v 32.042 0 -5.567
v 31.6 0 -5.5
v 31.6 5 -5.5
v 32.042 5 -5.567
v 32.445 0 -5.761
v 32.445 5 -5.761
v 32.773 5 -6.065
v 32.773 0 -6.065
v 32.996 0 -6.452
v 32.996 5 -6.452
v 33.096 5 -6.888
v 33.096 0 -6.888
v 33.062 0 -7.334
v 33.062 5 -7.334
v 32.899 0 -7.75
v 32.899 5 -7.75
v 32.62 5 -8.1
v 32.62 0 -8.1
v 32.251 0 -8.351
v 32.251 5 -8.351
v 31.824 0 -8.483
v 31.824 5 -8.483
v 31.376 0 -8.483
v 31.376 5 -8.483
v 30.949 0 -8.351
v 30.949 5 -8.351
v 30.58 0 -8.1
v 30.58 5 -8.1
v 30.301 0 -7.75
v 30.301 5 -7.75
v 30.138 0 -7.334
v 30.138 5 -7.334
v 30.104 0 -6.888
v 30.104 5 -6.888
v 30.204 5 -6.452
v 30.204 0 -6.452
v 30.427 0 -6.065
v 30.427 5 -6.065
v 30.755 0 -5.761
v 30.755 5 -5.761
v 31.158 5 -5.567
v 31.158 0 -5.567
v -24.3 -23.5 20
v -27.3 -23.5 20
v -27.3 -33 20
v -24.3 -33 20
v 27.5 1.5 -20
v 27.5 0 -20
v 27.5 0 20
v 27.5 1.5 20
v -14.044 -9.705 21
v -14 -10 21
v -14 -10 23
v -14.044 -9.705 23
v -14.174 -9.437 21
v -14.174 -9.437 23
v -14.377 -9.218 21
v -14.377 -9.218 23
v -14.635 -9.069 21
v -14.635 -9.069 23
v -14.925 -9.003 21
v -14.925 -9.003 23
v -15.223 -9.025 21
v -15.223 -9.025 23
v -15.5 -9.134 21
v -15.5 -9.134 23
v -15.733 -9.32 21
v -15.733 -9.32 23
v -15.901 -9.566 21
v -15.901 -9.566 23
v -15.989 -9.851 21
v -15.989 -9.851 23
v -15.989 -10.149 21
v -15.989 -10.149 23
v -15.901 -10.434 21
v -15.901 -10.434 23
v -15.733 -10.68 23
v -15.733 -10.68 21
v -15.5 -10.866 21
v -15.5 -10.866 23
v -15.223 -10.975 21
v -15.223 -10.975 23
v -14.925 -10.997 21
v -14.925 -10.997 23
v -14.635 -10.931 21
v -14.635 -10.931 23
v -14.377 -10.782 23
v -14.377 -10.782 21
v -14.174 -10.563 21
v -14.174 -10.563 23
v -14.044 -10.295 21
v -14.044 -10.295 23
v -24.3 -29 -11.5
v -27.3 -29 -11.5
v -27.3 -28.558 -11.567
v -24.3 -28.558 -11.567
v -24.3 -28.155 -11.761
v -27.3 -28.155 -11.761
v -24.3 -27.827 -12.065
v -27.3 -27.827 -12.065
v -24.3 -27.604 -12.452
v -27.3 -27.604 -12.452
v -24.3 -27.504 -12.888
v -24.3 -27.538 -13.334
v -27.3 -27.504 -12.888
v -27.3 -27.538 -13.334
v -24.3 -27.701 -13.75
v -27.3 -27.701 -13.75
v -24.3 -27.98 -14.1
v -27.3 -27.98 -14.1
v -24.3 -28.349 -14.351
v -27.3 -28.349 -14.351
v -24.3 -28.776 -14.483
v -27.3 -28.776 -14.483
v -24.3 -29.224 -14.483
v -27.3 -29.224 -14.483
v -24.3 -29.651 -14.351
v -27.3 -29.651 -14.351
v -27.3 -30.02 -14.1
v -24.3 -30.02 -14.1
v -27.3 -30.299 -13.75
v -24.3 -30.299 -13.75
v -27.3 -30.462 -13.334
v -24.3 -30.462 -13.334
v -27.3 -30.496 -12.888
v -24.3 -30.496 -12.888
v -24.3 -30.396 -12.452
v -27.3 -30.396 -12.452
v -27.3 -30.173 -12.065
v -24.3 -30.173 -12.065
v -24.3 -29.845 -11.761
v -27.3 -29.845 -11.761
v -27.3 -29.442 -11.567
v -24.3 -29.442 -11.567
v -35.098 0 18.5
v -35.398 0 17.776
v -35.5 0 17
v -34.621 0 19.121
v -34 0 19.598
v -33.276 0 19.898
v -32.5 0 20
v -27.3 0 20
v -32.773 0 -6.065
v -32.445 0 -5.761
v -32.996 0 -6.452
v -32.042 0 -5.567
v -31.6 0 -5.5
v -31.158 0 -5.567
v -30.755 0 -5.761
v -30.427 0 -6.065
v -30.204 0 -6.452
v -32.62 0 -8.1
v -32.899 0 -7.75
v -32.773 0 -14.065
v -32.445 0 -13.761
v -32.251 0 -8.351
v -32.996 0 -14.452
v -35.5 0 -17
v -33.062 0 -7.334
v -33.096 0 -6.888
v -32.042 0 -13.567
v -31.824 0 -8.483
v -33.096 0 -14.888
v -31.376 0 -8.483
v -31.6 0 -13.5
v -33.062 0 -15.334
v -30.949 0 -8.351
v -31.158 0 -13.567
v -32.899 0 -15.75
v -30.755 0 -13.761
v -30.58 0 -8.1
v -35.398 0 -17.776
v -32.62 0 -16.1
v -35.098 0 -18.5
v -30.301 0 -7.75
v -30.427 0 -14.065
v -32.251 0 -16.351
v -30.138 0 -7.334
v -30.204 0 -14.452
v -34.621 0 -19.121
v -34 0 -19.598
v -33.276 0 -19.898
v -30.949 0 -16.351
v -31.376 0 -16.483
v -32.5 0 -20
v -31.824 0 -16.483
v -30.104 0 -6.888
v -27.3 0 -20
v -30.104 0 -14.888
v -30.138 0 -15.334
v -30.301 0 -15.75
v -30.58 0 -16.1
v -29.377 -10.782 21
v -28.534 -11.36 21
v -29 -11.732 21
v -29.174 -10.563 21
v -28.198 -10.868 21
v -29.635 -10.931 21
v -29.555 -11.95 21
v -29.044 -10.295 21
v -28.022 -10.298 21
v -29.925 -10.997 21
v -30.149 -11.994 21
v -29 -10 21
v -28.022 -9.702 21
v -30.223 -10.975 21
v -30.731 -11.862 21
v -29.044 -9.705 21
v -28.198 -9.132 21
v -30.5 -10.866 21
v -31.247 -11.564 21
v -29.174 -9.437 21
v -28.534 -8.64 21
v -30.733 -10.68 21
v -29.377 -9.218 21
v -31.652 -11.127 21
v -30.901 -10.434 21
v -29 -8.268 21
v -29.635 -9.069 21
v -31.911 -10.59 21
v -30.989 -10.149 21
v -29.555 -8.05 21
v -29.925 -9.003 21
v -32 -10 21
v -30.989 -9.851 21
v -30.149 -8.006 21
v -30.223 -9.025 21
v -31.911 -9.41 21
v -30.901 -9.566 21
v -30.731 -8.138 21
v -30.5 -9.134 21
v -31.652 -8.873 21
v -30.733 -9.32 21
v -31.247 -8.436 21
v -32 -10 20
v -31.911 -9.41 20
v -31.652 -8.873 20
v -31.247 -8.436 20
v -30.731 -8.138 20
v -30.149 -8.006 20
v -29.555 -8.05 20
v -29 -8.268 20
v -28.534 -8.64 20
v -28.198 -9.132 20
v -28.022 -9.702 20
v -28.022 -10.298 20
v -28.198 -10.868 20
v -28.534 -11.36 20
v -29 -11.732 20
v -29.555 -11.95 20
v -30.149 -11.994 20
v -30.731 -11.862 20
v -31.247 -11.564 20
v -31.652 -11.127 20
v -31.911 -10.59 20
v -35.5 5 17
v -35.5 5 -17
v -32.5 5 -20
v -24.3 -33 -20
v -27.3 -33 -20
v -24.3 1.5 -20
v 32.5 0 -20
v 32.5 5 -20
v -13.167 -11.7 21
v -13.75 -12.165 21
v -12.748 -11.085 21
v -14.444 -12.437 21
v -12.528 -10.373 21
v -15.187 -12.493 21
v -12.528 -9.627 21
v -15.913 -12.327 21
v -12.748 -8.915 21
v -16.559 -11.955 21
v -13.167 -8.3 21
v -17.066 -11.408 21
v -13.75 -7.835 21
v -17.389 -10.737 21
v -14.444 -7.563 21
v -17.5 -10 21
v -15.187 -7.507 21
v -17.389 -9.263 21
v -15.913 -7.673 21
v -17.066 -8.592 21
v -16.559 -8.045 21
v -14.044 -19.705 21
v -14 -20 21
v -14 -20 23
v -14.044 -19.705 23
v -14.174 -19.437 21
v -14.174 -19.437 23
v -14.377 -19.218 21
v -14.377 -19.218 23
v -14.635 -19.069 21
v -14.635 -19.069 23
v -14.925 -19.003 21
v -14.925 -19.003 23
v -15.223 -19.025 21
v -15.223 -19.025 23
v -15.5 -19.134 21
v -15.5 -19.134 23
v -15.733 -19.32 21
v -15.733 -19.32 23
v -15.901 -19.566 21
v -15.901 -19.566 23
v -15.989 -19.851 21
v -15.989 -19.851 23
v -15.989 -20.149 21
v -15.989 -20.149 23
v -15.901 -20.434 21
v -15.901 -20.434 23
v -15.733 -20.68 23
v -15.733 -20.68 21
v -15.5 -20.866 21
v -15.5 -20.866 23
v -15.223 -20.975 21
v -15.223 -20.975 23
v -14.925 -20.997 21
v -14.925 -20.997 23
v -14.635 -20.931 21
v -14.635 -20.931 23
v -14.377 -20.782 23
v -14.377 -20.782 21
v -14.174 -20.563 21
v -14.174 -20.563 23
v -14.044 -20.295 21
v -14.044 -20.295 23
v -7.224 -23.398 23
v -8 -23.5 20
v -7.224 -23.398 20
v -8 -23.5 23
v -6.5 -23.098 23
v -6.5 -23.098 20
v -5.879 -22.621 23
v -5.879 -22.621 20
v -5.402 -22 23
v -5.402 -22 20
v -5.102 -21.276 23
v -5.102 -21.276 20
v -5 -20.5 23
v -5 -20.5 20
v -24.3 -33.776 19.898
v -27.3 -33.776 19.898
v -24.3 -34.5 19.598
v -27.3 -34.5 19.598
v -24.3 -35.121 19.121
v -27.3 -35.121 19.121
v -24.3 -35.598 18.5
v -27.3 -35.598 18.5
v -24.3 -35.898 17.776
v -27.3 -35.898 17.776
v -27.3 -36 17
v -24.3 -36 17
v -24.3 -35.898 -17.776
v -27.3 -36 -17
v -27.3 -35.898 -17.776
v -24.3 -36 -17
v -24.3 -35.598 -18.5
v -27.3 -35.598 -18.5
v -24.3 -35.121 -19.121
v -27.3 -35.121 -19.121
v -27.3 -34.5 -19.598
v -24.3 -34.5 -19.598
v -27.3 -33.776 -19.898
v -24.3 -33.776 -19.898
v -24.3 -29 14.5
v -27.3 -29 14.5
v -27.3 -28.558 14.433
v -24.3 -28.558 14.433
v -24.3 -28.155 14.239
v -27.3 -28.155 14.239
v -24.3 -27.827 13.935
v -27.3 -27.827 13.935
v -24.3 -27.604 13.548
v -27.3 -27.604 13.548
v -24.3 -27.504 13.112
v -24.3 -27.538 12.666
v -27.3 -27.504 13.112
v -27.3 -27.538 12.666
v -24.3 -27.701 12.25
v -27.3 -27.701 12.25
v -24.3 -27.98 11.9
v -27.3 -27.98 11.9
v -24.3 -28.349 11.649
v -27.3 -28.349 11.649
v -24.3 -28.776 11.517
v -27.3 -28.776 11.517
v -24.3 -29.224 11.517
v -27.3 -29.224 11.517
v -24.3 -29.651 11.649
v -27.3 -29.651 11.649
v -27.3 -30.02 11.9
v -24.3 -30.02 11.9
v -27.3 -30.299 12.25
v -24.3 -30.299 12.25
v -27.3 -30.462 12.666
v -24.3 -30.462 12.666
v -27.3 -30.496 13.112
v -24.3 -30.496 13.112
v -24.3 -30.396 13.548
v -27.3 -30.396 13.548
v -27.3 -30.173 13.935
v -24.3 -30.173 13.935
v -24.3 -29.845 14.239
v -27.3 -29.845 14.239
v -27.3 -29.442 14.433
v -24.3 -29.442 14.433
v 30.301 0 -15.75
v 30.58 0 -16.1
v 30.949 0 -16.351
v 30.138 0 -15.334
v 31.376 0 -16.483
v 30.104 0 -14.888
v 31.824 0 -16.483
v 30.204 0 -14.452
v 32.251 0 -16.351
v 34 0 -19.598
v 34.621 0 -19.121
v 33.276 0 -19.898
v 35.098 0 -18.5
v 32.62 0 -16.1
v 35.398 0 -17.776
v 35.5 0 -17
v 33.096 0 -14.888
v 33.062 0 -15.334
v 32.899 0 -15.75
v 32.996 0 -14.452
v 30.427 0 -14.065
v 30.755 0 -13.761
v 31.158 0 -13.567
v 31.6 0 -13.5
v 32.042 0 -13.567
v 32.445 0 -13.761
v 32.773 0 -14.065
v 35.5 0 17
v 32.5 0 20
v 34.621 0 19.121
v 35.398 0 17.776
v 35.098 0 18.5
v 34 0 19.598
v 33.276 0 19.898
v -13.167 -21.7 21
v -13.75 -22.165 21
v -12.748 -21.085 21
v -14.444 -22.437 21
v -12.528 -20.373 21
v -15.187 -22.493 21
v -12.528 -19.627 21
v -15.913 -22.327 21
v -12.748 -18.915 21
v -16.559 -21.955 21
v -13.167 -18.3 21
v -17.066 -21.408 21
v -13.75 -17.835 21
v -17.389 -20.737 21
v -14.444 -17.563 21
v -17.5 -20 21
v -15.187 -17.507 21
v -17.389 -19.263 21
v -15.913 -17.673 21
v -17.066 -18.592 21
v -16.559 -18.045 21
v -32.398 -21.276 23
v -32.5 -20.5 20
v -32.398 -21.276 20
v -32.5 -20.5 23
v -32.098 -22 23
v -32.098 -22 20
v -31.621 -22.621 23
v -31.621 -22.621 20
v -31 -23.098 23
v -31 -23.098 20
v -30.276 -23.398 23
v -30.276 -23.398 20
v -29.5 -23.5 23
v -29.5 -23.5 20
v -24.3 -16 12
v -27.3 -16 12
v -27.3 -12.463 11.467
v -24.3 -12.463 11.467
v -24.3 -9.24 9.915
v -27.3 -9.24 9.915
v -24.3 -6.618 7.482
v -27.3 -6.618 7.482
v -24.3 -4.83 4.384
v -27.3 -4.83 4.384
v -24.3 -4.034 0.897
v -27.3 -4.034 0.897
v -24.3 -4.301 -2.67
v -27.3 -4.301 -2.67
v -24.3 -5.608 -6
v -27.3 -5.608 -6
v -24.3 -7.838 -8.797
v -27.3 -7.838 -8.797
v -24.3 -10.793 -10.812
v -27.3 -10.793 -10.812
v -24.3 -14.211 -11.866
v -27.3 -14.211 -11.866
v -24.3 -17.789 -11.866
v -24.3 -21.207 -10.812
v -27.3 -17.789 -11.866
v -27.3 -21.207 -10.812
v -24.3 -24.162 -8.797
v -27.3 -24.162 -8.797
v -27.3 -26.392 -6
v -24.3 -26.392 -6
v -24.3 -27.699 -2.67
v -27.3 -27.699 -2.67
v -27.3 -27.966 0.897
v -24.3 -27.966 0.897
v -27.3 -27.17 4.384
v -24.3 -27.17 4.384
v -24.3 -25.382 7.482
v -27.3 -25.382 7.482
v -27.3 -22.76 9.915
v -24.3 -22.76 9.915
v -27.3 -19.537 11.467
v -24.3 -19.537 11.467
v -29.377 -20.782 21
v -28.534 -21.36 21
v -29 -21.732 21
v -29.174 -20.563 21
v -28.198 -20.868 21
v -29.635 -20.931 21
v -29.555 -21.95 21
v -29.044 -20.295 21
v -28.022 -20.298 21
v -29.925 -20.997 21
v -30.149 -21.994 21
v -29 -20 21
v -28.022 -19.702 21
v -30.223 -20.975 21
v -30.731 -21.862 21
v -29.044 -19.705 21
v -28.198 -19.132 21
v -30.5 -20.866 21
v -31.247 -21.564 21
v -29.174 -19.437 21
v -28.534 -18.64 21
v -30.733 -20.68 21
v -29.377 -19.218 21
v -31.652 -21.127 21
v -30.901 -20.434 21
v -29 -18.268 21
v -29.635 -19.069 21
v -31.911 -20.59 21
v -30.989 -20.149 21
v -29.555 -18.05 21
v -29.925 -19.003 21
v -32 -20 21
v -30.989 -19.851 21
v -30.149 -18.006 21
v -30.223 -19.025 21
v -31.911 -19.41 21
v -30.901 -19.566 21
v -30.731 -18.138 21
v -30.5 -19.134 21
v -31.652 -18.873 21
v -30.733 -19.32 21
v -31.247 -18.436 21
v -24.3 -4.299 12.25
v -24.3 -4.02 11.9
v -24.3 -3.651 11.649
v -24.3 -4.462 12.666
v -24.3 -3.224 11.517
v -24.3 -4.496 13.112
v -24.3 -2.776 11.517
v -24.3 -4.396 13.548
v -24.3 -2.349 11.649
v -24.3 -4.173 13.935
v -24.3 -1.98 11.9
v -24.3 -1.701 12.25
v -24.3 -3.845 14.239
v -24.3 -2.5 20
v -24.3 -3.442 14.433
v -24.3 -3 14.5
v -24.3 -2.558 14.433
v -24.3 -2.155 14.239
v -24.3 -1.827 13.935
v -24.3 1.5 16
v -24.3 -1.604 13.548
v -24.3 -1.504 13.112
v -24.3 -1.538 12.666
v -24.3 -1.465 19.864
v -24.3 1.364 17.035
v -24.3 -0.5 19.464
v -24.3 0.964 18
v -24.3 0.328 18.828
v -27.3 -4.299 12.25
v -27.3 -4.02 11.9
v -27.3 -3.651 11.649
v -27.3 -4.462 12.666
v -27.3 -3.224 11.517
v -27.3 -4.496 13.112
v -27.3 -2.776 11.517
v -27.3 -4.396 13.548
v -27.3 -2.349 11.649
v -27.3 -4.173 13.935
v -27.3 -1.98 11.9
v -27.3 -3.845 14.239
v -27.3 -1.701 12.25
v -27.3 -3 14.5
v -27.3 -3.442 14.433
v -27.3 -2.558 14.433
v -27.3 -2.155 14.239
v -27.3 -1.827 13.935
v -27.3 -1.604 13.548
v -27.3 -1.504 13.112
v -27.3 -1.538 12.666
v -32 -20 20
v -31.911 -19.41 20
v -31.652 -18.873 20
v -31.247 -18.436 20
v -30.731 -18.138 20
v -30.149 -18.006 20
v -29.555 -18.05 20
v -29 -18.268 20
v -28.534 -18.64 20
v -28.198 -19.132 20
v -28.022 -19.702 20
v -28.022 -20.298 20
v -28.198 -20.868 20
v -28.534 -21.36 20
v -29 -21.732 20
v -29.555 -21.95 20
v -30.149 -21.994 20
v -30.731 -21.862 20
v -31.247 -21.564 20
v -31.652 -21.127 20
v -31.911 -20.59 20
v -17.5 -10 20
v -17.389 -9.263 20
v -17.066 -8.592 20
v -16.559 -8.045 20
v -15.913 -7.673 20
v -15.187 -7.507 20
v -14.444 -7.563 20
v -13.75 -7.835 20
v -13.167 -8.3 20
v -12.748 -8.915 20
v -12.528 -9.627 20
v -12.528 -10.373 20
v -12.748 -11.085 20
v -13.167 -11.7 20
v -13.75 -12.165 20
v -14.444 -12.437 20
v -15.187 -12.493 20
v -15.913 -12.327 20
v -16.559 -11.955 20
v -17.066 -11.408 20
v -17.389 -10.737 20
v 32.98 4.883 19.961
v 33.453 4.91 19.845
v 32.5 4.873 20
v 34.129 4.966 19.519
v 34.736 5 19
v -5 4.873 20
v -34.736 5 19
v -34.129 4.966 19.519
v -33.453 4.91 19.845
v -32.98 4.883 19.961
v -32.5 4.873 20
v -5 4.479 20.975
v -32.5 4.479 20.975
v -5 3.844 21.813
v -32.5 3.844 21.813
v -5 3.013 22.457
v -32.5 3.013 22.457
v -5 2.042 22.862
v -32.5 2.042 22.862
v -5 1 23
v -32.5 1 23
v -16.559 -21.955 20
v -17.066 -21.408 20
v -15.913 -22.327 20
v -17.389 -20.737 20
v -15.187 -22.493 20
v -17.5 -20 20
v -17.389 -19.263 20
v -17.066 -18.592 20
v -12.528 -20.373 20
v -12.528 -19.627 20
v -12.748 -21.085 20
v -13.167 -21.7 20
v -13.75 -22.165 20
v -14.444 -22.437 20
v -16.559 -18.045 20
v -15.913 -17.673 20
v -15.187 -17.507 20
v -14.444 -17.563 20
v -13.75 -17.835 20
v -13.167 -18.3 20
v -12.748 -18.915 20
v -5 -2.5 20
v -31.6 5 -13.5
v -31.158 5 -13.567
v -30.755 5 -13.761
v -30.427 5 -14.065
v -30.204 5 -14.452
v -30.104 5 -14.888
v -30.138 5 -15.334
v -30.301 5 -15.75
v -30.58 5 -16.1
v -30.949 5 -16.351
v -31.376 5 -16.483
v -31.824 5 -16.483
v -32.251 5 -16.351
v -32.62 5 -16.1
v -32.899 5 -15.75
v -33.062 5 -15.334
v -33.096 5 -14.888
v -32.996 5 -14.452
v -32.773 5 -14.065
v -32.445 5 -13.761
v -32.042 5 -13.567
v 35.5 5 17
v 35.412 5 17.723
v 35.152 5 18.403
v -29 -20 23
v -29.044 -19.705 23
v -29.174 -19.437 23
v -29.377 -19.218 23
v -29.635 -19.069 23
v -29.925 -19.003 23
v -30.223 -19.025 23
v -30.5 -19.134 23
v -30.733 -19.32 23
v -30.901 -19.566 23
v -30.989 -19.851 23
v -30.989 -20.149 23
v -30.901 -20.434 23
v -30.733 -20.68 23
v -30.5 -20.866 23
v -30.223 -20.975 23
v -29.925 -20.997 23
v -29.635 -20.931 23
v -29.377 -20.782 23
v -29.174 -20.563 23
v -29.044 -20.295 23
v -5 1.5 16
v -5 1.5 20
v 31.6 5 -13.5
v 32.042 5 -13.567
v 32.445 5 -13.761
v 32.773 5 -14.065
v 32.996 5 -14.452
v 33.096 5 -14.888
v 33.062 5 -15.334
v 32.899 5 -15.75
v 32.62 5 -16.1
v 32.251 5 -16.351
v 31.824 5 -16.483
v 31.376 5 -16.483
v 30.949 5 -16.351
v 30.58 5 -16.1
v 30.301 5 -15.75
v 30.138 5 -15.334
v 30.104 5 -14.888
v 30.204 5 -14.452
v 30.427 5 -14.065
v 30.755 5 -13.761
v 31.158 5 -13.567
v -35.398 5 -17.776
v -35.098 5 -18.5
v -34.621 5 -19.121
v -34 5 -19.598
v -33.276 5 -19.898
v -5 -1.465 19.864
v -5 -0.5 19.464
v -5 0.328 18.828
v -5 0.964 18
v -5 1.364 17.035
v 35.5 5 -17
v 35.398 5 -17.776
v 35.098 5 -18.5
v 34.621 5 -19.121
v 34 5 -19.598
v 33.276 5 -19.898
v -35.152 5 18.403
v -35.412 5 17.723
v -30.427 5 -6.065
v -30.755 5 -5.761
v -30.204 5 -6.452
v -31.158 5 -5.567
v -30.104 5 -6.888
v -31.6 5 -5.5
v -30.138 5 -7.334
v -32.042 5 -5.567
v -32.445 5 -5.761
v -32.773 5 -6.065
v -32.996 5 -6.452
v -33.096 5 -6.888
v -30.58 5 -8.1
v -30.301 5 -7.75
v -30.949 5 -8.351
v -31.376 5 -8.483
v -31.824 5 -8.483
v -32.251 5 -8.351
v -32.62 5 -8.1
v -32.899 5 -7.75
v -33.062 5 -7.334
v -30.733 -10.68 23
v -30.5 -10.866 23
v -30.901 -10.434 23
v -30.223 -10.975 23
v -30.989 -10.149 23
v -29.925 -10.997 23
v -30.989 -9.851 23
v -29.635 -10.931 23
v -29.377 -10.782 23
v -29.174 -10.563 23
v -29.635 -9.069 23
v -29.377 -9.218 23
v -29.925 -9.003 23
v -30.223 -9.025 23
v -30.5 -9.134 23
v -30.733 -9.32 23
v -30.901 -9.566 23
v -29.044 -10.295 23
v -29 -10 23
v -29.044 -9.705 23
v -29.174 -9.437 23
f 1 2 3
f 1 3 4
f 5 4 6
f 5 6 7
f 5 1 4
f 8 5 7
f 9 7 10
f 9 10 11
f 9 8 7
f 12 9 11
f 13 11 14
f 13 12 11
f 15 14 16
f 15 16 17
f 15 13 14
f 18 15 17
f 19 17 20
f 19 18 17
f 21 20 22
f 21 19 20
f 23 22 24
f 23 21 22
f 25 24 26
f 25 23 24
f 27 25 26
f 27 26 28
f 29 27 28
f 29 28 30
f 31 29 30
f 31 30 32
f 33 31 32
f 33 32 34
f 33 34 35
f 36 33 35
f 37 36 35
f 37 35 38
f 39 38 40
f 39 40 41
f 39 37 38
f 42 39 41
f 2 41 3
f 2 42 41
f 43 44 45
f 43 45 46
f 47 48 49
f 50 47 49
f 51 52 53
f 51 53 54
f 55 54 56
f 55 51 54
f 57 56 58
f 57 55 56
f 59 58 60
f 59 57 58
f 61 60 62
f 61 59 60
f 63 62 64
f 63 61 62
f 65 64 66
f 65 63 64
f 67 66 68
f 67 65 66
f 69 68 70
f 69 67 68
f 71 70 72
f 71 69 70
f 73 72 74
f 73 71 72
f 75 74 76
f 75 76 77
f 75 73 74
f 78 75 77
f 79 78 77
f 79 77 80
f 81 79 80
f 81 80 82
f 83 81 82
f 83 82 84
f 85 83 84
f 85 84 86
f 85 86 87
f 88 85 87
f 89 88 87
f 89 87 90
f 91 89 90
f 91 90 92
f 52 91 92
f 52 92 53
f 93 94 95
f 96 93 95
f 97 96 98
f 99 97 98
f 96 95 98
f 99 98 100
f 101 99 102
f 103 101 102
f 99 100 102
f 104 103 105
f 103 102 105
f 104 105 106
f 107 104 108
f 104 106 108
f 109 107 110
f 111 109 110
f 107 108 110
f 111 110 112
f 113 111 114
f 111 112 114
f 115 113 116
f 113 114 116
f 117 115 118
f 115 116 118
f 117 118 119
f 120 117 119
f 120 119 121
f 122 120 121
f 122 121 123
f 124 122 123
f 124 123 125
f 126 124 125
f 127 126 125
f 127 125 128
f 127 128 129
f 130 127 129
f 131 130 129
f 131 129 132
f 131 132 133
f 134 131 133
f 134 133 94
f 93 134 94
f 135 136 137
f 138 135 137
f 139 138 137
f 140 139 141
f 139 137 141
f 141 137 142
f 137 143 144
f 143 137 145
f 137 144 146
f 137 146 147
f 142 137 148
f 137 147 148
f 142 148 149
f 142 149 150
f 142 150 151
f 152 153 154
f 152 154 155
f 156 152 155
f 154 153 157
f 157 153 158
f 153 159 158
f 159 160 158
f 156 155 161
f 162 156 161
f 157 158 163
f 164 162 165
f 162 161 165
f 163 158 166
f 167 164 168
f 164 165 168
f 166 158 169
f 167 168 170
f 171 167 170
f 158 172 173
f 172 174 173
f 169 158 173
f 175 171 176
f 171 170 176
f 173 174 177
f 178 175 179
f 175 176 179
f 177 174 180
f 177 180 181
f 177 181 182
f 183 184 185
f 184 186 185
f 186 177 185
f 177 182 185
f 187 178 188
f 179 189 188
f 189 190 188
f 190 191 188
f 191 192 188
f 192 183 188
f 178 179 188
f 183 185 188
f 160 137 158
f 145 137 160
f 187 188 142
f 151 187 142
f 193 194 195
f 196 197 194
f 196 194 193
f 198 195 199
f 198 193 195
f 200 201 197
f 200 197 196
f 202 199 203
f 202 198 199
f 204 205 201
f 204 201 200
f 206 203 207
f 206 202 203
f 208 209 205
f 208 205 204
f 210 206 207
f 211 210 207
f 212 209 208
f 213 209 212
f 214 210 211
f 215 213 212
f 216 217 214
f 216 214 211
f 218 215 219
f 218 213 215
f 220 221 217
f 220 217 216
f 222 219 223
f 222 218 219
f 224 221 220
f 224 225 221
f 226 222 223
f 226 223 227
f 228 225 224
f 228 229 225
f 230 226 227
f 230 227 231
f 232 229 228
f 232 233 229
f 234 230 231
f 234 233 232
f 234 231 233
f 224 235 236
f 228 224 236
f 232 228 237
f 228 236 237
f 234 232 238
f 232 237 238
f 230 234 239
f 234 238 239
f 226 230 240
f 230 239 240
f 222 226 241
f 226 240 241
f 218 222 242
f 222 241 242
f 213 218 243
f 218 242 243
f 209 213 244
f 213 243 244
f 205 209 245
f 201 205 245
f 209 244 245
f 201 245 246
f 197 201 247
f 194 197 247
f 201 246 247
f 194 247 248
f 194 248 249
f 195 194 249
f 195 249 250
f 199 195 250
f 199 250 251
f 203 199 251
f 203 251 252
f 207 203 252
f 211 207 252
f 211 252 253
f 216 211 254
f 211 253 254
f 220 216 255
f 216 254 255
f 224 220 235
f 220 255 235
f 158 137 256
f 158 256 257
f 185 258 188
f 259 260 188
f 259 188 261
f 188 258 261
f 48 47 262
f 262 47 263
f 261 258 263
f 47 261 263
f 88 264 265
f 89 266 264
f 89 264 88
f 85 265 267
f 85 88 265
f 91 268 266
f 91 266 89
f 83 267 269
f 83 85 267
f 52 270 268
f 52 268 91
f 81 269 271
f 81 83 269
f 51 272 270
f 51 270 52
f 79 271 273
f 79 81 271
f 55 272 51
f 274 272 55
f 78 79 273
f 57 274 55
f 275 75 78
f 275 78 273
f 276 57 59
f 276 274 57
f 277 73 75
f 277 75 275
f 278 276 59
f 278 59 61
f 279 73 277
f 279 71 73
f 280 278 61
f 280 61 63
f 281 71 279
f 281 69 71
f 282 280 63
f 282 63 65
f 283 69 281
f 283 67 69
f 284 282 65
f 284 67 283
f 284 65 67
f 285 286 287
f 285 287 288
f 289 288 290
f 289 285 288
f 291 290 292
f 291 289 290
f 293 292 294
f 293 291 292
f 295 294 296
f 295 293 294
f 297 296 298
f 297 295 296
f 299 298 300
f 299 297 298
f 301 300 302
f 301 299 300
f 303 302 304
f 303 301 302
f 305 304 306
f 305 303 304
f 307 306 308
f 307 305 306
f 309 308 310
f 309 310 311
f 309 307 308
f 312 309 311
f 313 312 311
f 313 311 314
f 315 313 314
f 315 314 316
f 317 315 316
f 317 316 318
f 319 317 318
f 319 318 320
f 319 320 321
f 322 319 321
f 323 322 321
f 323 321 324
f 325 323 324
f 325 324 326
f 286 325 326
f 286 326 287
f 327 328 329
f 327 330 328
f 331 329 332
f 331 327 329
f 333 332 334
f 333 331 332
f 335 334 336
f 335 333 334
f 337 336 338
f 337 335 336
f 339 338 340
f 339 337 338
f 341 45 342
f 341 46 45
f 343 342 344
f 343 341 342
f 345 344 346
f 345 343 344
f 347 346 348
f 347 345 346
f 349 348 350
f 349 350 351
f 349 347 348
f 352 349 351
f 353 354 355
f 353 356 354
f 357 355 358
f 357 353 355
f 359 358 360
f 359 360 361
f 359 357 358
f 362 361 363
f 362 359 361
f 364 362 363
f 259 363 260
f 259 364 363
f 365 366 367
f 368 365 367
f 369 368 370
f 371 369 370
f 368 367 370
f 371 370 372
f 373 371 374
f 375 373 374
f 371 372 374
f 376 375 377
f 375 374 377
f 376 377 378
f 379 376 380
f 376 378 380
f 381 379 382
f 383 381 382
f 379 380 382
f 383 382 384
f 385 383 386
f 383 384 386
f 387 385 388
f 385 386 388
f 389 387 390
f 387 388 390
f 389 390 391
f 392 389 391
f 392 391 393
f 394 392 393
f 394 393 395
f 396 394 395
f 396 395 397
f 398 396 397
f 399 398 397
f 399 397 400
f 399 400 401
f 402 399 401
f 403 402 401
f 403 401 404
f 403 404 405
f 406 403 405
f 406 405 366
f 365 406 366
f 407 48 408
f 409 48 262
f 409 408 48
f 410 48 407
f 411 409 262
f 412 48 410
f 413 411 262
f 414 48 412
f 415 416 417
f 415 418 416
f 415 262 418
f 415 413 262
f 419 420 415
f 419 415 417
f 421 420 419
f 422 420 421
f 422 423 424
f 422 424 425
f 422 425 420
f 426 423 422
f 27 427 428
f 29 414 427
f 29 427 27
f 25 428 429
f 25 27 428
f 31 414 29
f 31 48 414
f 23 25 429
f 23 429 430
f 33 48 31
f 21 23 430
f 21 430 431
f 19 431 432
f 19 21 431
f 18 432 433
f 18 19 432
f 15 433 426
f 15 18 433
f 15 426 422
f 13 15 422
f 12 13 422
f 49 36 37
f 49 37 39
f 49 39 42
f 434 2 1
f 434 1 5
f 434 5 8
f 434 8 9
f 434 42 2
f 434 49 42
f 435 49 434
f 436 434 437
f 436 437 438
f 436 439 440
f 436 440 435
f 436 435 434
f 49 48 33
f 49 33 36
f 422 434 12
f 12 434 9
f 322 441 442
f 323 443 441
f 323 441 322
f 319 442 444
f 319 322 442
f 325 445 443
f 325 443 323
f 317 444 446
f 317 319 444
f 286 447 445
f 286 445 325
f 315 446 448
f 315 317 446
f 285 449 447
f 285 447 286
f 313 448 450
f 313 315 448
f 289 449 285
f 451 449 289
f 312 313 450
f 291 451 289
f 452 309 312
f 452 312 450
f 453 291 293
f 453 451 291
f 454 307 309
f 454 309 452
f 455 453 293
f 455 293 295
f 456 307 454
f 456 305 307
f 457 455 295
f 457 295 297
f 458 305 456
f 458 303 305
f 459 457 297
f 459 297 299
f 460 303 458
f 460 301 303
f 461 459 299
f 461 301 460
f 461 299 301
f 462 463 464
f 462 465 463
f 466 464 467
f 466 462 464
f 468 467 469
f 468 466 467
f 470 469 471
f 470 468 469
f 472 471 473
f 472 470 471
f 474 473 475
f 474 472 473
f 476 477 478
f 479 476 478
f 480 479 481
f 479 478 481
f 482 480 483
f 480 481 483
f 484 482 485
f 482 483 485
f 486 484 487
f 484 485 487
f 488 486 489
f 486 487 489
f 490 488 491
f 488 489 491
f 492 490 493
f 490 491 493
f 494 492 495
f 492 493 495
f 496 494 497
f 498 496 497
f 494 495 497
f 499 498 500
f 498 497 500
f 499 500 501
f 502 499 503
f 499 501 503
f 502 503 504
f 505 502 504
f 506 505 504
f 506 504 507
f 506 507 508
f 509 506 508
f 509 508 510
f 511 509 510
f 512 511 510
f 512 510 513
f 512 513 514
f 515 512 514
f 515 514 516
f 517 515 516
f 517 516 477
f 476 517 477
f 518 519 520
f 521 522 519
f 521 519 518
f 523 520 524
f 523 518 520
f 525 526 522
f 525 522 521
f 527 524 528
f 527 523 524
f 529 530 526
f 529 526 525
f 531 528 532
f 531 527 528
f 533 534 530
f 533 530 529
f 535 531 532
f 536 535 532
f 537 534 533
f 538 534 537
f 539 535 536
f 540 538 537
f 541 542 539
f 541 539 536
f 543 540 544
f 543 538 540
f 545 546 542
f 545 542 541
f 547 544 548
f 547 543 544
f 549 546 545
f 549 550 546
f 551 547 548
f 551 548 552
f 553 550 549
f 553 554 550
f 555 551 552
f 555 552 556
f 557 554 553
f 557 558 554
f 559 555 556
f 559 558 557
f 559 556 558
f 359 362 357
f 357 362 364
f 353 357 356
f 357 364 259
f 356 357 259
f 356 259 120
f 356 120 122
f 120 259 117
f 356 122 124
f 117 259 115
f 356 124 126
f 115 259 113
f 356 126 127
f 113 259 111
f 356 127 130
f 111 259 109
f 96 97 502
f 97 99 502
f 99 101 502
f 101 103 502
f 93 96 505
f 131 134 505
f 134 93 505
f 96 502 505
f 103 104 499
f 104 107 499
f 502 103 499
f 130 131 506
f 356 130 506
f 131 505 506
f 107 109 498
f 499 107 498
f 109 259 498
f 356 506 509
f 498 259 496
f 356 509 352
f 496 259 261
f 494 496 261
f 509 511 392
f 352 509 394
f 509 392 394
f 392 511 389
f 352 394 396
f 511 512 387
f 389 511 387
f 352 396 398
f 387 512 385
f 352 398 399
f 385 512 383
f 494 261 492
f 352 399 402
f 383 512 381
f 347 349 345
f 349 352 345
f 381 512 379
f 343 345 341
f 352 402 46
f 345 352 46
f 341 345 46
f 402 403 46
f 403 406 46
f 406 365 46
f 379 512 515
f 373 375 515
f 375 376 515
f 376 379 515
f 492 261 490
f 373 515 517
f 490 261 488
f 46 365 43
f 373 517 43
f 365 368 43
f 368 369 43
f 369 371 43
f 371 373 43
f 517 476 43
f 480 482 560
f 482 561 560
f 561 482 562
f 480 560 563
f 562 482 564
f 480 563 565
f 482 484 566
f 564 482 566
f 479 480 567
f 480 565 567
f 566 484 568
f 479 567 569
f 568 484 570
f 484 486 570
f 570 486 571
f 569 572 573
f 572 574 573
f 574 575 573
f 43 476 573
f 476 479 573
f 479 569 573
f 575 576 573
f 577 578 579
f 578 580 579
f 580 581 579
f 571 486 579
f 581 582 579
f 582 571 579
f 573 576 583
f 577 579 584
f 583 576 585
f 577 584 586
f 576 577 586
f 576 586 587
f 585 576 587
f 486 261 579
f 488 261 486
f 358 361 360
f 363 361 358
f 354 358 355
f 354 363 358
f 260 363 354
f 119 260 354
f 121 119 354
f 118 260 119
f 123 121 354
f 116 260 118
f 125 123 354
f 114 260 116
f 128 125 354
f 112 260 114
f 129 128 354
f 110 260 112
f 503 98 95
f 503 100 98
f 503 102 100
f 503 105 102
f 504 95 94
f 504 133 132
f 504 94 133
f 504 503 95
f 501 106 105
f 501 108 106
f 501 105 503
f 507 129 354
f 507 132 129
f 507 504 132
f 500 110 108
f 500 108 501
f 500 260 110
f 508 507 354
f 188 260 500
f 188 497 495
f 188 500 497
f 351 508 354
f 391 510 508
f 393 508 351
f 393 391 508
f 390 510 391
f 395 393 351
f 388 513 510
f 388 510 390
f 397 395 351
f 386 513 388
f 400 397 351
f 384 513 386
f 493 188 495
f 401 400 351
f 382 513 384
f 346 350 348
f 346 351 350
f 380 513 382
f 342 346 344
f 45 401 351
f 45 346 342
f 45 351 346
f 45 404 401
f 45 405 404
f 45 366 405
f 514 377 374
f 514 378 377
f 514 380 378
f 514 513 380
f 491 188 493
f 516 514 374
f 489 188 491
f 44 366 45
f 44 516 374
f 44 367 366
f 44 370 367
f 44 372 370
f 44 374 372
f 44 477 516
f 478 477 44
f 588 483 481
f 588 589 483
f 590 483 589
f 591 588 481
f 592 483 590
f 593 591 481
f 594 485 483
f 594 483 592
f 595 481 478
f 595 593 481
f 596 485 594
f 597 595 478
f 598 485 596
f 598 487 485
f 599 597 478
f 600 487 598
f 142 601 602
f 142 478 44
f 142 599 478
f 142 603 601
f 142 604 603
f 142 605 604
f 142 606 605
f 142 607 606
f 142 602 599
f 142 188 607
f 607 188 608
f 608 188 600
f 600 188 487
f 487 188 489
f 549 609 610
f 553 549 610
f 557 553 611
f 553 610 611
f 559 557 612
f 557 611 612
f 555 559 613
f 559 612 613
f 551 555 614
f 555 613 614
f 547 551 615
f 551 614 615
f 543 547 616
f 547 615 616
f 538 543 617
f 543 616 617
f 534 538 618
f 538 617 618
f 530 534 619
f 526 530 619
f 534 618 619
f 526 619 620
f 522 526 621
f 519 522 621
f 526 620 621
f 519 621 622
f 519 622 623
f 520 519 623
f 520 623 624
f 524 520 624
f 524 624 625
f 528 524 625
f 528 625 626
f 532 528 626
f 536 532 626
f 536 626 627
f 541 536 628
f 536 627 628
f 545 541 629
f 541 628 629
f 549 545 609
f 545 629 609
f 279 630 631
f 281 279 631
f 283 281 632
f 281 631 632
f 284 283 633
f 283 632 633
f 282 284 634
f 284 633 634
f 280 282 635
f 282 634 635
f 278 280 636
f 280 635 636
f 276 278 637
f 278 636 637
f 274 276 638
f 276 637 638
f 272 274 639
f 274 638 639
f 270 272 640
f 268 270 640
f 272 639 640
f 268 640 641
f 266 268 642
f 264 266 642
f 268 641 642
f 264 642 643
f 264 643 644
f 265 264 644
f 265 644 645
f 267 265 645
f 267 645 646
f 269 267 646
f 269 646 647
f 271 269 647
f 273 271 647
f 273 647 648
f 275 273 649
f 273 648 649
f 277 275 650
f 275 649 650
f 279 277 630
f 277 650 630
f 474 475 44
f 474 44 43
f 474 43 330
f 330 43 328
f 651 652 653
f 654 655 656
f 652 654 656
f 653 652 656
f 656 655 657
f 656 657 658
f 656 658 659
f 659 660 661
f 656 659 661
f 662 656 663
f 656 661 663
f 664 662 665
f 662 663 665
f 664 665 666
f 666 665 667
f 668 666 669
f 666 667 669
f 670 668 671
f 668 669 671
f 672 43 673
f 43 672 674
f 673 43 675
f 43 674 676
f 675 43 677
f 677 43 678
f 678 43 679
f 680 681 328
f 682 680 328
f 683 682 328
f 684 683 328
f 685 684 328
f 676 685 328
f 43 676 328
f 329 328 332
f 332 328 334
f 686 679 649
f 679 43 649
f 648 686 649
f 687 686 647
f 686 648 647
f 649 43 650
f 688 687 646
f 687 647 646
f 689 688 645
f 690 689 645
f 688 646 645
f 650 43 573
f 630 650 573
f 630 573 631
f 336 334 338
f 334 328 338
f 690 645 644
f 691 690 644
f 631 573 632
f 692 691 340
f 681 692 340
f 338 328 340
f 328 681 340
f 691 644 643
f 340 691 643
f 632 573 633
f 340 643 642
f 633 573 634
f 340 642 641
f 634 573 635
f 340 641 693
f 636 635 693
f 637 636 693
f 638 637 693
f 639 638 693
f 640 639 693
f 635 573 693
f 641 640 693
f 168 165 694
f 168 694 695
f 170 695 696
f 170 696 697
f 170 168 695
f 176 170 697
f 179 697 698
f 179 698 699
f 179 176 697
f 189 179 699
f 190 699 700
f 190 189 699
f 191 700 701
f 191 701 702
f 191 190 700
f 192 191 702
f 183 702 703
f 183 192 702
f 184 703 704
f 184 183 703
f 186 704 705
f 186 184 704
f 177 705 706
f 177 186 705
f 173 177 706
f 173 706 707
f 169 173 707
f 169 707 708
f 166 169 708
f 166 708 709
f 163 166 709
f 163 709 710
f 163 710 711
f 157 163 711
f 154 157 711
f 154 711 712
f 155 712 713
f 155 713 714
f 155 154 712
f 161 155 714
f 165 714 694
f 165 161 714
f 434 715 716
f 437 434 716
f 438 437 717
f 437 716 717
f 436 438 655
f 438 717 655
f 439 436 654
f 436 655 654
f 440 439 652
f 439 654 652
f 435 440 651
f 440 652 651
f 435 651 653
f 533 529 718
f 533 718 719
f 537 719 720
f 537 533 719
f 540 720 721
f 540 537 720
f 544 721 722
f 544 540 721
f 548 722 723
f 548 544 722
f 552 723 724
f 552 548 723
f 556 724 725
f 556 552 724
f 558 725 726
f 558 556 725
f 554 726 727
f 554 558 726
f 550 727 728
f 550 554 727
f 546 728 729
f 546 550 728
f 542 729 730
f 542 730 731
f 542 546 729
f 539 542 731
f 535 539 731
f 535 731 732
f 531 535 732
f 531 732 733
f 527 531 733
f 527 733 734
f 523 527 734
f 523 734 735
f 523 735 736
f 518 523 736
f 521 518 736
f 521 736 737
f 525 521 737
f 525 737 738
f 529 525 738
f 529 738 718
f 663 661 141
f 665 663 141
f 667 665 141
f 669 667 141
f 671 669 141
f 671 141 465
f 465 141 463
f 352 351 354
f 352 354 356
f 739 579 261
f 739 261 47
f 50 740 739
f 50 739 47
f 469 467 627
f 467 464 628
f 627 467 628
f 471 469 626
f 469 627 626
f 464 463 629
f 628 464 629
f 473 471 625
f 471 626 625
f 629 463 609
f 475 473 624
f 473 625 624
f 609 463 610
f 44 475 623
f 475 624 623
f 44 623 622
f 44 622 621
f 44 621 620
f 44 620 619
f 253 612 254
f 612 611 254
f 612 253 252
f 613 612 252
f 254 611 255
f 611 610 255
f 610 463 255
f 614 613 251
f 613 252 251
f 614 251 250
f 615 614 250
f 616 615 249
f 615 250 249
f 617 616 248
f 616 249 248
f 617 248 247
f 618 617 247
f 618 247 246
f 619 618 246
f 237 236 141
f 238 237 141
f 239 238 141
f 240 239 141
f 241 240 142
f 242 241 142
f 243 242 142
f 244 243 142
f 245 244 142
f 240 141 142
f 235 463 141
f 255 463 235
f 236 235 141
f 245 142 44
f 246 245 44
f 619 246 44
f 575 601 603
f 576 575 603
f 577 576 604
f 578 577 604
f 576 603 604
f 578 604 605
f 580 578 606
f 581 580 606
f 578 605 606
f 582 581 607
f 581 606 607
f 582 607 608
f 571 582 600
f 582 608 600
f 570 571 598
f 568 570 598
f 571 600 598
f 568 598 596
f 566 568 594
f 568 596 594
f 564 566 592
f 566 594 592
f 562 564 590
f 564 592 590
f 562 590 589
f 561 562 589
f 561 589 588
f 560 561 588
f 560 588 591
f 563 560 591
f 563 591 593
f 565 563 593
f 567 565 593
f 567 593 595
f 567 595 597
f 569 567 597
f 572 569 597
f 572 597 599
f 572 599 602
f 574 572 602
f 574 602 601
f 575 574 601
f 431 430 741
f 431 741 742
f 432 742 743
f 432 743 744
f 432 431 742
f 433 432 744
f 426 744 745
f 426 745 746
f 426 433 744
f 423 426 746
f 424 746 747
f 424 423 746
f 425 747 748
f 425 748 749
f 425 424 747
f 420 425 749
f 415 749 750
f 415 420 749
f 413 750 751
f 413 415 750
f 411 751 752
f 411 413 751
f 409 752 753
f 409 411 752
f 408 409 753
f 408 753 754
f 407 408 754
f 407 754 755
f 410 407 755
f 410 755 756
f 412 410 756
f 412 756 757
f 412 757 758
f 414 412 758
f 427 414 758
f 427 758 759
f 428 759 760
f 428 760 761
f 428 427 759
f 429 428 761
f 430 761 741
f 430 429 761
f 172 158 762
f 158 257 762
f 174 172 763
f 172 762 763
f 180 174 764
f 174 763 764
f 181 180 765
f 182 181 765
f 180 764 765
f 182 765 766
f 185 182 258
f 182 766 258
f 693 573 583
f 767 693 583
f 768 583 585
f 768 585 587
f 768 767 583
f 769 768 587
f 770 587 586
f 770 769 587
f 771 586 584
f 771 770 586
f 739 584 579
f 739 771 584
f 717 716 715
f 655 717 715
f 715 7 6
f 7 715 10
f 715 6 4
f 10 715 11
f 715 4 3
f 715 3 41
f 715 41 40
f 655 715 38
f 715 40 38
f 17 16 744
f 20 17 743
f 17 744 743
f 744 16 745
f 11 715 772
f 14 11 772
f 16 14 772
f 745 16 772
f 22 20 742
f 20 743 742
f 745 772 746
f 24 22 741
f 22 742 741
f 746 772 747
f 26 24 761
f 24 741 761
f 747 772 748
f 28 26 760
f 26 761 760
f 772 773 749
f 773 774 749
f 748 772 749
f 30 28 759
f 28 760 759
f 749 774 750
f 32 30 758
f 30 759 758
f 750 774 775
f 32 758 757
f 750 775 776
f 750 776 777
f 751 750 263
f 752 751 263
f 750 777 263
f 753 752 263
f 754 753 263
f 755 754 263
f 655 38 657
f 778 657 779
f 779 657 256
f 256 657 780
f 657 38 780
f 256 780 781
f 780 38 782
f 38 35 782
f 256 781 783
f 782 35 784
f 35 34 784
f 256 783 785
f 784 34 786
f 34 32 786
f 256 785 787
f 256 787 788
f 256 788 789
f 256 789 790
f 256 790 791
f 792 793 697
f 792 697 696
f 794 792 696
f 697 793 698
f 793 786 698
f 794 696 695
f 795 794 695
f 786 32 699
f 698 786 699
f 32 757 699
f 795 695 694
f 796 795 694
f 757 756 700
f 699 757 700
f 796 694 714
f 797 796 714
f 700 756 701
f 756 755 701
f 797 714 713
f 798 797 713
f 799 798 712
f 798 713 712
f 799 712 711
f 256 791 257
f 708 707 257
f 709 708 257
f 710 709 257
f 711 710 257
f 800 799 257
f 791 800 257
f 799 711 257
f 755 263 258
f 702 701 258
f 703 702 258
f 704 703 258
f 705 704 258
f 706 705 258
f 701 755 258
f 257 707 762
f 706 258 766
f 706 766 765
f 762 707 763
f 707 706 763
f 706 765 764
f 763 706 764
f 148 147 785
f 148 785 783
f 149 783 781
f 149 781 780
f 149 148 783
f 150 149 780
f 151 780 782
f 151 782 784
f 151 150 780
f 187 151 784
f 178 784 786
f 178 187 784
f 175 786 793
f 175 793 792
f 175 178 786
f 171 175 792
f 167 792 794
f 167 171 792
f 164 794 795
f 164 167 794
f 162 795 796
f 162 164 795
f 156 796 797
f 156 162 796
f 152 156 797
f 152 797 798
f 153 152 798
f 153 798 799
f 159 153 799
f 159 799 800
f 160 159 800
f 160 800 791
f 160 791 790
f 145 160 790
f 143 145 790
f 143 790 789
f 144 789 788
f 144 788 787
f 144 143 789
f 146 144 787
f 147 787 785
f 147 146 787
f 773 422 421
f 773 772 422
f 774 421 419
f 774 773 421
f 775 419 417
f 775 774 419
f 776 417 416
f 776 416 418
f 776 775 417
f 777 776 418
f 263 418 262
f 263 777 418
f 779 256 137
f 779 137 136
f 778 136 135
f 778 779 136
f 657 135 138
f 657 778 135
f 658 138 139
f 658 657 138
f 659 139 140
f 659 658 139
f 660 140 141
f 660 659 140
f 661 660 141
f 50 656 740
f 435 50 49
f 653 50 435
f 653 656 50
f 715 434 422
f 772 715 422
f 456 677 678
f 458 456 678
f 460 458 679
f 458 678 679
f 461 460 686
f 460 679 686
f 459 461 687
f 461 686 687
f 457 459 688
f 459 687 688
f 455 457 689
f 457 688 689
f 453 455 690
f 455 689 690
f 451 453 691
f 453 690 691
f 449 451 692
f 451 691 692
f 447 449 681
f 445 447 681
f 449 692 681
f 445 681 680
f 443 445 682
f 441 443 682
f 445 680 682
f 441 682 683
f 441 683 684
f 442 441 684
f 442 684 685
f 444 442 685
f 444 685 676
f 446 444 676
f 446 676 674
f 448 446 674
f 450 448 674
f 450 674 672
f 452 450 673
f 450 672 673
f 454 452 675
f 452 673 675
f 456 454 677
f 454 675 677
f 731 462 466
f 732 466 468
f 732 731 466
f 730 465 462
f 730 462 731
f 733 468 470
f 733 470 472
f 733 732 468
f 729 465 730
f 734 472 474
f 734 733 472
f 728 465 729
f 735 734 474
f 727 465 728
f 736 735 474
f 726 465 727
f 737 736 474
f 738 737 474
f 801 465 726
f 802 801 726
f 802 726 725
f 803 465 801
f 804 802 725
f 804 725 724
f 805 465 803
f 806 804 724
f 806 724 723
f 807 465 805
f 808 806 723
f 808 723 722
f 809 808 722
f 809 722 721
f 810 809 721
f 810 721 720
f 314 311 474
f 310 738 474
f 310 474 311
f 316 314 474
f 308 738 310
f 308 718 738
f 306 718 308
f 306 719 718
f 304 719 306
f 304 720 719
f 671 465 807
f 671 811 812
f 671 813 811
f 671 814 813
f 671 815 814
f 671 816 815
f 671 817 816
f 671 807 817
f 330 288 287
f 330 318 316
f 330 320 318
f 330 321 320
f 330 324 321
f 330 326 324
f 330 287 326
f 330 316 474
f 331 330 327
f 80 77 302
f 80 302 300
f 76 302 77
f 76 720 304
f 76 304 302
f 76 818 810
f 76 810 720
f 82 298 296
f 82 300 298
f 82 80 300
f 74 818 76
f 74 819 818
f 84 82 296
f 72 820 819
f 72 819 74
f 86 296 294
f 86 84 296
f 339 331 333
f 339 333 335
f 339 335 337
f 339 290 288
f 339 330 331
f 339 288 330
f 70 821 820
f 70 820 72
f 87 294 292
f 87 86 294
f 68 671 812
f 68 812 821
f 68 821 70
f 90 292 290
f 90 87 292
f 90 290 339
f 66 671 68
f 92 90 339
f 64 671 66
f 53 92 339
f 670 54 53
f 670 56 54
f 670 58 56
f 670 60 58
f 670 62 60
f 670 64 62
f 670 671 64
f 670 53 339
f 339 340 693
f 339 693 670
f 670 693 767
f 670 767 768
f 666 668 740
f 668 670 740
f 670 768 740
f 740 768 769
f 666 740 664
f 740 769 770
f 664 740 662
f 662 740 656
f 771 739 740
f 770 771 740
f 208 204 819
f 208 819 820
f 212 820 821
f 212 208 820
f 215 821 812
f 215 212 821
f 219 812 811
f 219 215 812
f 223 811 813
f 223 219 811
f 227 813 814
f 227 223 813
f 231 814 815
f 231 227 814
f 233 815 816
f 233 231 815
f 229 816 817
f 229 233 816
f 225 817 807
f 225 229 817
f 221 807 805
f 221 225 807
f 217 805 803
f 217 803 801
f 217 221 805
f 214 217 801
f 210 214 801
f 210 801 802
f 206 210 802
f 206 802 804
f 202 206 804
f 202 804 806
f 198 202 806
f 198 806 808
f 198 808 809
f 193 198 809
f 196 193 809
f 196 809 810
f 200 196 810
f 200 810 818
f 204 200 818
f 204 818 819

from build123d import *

# Parameters (mm, degrees)
SKETCH_1_W          = 14
SKETCH_1_H          = 40
SKETCH_1_R          = 1.5
EXTRUDE_1_DEPTH     = 5
EXTRUDE_1_2_DEPTH   = 5
SKETCH_3_W          = 3
SKETCH_3_H          = 40
EXTRUDE_3_DEPTH     = 36
SKETCH_4_R          = 1.5
SKETCH_4_R_2        = 12
CUT_EXTRUDE_1_DEPTH = 30
SKETCH_8_W          = 43
SKETCH_8_H          = 5
EXTRUDE_4_DEPTH     = 40
SKETCH_9_W          = 51.8
SKETCH_9_H          = 40
CUT_EXTRUDE_2_DEPTH = 1.5
FILLET_1_R          = 3
SKETCH_10_W         = 19.3
SKETCH_10_H         = 25
SKETCH_10_R         = 1
SKETCH_10_W_2       = 5.2
SKETCH_10_H_2       = 23.5
EXTRUDE_5_DEPTH     = 3
SKETCH_11_R         = 2.5
SKETCH_11_R_2       = 2
CUT_EXTRUDE_3_DEPTH = 1
FILLET_2_R          = 4
FILLET_3_R          = 3


with BuildPart() as part:
    # 草图1 → 凸台-拉伸1 (new body)
    with BuildSketch(Plane(origin=(0, 0, 0), x_dir=(1, 0, 0), z_dir=(0, 1, 0))):
        with Locations((-28.5, 0)):
            Rectangle(SKETCH_1_W, SKETCH_1_H)
        with Locations(Location((-31.6, 7, 0), (0, 0, 270))):
            Circle(SKETCH_1_R, mode=Mode.SUBTRACT)
        with Locations(Location((-31.6, 15, 0), (0, 0, 270))):
            Circle(SKETCH_1_R, mode=Mode.SUBTRACT)
    extrude(amount=EXTRUDE_1_DEPTH)

    # 草图3 → 凸台-拉伸3 (add)
    with BuildSketch(Plane.XZ):
        with Locations((-25.8, 0)):
            Rectangle(SKETCH_3_W, SKETCH_3_H)
    extrude(amount=EXTRUDE_3_DEPTH)

    # 草图4 → 切除-拉伸1 (cut)
    with BuildSketch(Plane.ZY.offset(27.3)):
        with Locations((13, -3)):
            Circle(SKETCH_4_R)
        with Locations((13, -29)):
            Circle(SKETCH_4_R)
        with Locations((-13, -29)):
            Circle(SKETCH_4_R)
        with Locations((0, -16)):
            Circle(SKETCH_4_R_2)
    extrude(amount=-CUT_EXTRUDE_1_DEPTH, mode=Mode.SUBTRACT)



with BuildPart() as body_2:
    # 草图1 → Extrude 1 2 (new body)
    with BuildSketch(Plane(origin=(0, 0, 0), x_dir=(1, 0, 0), z_dir=(0, 1, 0))):
        with Locations((28.5, 0)):
            Rectangle(SKETCH_1_W, SKETCH_1_H)
        with Locations(Location((31.6, 7, 0), (0, 0, 270))):
            Circle(SKETCH_1_R, mode=Mode.SUBTRACT)
        with Locations(Location((31.6, 15, 0), (0, 0, 270))):
            Circle(SKETCH_1_R, mode=Mode.SUBTRACT)
    extrude(amount=EXTRUDE_1_2_DEPTH)


with BuildPart() as part_1:
    add(part.part)

    add(body_2.part)  # 凸台-拉伸4 merges body 2
    # 草图8 → 凸台-拉伸4 (add)
    with BuildSketch(Plane.XY.offset(20)):
        with Locations((0, 2.5)):
            Rectangle(SKETCH_8_W, SKETCH_8_H)
    extrude(amount=-EXTRUDE_4_DEPTH)

    # 草图9 → 切除-拉伸2 (cut)
    with BuildSketch(Plane.XZ):
        with Locations((1.6, 0)):
            Rectangle(SKETCH_9_W, SKETCH_9_H)
    extrude(amount=-CUT_EXTRUDE_2_DEPTH, mode=Mode.SUBTRACT)

    # 圆角1
    fillet_1_edges = [part_1.edges().sort_by_distance(p)[0] for p in [
        (-35.5, 2.5, 20),
        (-35.5, 2.5, -20),
        (-25.8, -36, -20),
        (-25.8, -36, 20),
        (35.5, 2.5, 20),
        (35.5, 2.5, -20),
    ]]
    fillet(fillet_1_edges, radius=FILLET_1_R)

    # 草图10 → 凸台-拉伸5 (add)
    # profile 1 of 4: a face of its own
    with BuildSketch(Plane.XY.offset(20)):
        Polygon((-32.5, 5), (-32.5, 1.5), (-24.3, 1.5), (-5, 1.5), (-5, 5), align=None)
    # profile 2 of 4: a face of its own
    with BuildSketch(Plane.XY.offset(20)):
        with Locations((-14.65, -11)):
            Rectangle(SKETCH_10_W, SKETCH_10_H)
        with Locations((-15, -20)):
            Circle(SKETCH_10_R, mode=Mode.SUBTRACT)
        with Locations((-15, -10)):
            Circle(SKETCH_10_R, mode=Mode.SUBTRACT)
    # profile 3 of 4: a face of its own
    with BuildSketch(Plane.XY.offset(20)):
        Polygon((-32.5, 1.5), (-32.5, 0), (-27.3, 0), (-27.3, -23.5), (-24.3, -23.5), (-24.3, 1.5), align=None)
    # profile 4 of 4: a face of its own
    with BuildSketch(Plane.XY.offset(20)):
        with Locations((-29.9, -11.75)):
            Rectangle(SKETCH_10_W_2, SKETCH_10_H_2)
        with Locations((-30, -20)):
            Circle(SKETCH_10_R, mode=Mode.SUBTRACT)
        with Locations((-30, -10)):
            Circle(SKETCH_10_R, mode=Mode.SUBTRACT)
    extrude(amount=EXTRUDE_5_DEPTH)

    # 草图11 → 切除-拉伸3 (cut)
    with BuildSketch(Plane(origin=(0, 0, 20), x_dir=(-1, 0, 0), z_dir=(0, 0, -1))):
        with Locations((15, -10)):
            Circle(SKETCH_11_R)
        with Locations((30, -10)):
            Circle(SKETCH_11_R_2)
        with Locations((30, -20)):
            Circle(SKETCH_11_R_2)
        with Locations((15, -20)):
            Circle(SKETCH_11_R)
    extrude(amount=-CUT_EXTRUDE_3_DEPTH, mode=Mode.SUBTRACT)

    # 圆角2
    fillet_2_edges = [part_1.edges().sort_by_distance(p)[0] for p in [
        (-14.65, 1.5, 20),
        (-18.75, 5, 23),
    ]]
    fillet(fillet_2_edges, radius=FILLET_2_R)

    # 圆角3
    fillet_3_edges = [part_1.edges().sort_by_distance(p)[0] for p in [
        (-5, -23.5, 21.5),
        (-32.5, -23.5, 21.5),
    ]]
    fillet(fillet_3_edges, radius=FILLET_3_R)


solid = part_1.part
